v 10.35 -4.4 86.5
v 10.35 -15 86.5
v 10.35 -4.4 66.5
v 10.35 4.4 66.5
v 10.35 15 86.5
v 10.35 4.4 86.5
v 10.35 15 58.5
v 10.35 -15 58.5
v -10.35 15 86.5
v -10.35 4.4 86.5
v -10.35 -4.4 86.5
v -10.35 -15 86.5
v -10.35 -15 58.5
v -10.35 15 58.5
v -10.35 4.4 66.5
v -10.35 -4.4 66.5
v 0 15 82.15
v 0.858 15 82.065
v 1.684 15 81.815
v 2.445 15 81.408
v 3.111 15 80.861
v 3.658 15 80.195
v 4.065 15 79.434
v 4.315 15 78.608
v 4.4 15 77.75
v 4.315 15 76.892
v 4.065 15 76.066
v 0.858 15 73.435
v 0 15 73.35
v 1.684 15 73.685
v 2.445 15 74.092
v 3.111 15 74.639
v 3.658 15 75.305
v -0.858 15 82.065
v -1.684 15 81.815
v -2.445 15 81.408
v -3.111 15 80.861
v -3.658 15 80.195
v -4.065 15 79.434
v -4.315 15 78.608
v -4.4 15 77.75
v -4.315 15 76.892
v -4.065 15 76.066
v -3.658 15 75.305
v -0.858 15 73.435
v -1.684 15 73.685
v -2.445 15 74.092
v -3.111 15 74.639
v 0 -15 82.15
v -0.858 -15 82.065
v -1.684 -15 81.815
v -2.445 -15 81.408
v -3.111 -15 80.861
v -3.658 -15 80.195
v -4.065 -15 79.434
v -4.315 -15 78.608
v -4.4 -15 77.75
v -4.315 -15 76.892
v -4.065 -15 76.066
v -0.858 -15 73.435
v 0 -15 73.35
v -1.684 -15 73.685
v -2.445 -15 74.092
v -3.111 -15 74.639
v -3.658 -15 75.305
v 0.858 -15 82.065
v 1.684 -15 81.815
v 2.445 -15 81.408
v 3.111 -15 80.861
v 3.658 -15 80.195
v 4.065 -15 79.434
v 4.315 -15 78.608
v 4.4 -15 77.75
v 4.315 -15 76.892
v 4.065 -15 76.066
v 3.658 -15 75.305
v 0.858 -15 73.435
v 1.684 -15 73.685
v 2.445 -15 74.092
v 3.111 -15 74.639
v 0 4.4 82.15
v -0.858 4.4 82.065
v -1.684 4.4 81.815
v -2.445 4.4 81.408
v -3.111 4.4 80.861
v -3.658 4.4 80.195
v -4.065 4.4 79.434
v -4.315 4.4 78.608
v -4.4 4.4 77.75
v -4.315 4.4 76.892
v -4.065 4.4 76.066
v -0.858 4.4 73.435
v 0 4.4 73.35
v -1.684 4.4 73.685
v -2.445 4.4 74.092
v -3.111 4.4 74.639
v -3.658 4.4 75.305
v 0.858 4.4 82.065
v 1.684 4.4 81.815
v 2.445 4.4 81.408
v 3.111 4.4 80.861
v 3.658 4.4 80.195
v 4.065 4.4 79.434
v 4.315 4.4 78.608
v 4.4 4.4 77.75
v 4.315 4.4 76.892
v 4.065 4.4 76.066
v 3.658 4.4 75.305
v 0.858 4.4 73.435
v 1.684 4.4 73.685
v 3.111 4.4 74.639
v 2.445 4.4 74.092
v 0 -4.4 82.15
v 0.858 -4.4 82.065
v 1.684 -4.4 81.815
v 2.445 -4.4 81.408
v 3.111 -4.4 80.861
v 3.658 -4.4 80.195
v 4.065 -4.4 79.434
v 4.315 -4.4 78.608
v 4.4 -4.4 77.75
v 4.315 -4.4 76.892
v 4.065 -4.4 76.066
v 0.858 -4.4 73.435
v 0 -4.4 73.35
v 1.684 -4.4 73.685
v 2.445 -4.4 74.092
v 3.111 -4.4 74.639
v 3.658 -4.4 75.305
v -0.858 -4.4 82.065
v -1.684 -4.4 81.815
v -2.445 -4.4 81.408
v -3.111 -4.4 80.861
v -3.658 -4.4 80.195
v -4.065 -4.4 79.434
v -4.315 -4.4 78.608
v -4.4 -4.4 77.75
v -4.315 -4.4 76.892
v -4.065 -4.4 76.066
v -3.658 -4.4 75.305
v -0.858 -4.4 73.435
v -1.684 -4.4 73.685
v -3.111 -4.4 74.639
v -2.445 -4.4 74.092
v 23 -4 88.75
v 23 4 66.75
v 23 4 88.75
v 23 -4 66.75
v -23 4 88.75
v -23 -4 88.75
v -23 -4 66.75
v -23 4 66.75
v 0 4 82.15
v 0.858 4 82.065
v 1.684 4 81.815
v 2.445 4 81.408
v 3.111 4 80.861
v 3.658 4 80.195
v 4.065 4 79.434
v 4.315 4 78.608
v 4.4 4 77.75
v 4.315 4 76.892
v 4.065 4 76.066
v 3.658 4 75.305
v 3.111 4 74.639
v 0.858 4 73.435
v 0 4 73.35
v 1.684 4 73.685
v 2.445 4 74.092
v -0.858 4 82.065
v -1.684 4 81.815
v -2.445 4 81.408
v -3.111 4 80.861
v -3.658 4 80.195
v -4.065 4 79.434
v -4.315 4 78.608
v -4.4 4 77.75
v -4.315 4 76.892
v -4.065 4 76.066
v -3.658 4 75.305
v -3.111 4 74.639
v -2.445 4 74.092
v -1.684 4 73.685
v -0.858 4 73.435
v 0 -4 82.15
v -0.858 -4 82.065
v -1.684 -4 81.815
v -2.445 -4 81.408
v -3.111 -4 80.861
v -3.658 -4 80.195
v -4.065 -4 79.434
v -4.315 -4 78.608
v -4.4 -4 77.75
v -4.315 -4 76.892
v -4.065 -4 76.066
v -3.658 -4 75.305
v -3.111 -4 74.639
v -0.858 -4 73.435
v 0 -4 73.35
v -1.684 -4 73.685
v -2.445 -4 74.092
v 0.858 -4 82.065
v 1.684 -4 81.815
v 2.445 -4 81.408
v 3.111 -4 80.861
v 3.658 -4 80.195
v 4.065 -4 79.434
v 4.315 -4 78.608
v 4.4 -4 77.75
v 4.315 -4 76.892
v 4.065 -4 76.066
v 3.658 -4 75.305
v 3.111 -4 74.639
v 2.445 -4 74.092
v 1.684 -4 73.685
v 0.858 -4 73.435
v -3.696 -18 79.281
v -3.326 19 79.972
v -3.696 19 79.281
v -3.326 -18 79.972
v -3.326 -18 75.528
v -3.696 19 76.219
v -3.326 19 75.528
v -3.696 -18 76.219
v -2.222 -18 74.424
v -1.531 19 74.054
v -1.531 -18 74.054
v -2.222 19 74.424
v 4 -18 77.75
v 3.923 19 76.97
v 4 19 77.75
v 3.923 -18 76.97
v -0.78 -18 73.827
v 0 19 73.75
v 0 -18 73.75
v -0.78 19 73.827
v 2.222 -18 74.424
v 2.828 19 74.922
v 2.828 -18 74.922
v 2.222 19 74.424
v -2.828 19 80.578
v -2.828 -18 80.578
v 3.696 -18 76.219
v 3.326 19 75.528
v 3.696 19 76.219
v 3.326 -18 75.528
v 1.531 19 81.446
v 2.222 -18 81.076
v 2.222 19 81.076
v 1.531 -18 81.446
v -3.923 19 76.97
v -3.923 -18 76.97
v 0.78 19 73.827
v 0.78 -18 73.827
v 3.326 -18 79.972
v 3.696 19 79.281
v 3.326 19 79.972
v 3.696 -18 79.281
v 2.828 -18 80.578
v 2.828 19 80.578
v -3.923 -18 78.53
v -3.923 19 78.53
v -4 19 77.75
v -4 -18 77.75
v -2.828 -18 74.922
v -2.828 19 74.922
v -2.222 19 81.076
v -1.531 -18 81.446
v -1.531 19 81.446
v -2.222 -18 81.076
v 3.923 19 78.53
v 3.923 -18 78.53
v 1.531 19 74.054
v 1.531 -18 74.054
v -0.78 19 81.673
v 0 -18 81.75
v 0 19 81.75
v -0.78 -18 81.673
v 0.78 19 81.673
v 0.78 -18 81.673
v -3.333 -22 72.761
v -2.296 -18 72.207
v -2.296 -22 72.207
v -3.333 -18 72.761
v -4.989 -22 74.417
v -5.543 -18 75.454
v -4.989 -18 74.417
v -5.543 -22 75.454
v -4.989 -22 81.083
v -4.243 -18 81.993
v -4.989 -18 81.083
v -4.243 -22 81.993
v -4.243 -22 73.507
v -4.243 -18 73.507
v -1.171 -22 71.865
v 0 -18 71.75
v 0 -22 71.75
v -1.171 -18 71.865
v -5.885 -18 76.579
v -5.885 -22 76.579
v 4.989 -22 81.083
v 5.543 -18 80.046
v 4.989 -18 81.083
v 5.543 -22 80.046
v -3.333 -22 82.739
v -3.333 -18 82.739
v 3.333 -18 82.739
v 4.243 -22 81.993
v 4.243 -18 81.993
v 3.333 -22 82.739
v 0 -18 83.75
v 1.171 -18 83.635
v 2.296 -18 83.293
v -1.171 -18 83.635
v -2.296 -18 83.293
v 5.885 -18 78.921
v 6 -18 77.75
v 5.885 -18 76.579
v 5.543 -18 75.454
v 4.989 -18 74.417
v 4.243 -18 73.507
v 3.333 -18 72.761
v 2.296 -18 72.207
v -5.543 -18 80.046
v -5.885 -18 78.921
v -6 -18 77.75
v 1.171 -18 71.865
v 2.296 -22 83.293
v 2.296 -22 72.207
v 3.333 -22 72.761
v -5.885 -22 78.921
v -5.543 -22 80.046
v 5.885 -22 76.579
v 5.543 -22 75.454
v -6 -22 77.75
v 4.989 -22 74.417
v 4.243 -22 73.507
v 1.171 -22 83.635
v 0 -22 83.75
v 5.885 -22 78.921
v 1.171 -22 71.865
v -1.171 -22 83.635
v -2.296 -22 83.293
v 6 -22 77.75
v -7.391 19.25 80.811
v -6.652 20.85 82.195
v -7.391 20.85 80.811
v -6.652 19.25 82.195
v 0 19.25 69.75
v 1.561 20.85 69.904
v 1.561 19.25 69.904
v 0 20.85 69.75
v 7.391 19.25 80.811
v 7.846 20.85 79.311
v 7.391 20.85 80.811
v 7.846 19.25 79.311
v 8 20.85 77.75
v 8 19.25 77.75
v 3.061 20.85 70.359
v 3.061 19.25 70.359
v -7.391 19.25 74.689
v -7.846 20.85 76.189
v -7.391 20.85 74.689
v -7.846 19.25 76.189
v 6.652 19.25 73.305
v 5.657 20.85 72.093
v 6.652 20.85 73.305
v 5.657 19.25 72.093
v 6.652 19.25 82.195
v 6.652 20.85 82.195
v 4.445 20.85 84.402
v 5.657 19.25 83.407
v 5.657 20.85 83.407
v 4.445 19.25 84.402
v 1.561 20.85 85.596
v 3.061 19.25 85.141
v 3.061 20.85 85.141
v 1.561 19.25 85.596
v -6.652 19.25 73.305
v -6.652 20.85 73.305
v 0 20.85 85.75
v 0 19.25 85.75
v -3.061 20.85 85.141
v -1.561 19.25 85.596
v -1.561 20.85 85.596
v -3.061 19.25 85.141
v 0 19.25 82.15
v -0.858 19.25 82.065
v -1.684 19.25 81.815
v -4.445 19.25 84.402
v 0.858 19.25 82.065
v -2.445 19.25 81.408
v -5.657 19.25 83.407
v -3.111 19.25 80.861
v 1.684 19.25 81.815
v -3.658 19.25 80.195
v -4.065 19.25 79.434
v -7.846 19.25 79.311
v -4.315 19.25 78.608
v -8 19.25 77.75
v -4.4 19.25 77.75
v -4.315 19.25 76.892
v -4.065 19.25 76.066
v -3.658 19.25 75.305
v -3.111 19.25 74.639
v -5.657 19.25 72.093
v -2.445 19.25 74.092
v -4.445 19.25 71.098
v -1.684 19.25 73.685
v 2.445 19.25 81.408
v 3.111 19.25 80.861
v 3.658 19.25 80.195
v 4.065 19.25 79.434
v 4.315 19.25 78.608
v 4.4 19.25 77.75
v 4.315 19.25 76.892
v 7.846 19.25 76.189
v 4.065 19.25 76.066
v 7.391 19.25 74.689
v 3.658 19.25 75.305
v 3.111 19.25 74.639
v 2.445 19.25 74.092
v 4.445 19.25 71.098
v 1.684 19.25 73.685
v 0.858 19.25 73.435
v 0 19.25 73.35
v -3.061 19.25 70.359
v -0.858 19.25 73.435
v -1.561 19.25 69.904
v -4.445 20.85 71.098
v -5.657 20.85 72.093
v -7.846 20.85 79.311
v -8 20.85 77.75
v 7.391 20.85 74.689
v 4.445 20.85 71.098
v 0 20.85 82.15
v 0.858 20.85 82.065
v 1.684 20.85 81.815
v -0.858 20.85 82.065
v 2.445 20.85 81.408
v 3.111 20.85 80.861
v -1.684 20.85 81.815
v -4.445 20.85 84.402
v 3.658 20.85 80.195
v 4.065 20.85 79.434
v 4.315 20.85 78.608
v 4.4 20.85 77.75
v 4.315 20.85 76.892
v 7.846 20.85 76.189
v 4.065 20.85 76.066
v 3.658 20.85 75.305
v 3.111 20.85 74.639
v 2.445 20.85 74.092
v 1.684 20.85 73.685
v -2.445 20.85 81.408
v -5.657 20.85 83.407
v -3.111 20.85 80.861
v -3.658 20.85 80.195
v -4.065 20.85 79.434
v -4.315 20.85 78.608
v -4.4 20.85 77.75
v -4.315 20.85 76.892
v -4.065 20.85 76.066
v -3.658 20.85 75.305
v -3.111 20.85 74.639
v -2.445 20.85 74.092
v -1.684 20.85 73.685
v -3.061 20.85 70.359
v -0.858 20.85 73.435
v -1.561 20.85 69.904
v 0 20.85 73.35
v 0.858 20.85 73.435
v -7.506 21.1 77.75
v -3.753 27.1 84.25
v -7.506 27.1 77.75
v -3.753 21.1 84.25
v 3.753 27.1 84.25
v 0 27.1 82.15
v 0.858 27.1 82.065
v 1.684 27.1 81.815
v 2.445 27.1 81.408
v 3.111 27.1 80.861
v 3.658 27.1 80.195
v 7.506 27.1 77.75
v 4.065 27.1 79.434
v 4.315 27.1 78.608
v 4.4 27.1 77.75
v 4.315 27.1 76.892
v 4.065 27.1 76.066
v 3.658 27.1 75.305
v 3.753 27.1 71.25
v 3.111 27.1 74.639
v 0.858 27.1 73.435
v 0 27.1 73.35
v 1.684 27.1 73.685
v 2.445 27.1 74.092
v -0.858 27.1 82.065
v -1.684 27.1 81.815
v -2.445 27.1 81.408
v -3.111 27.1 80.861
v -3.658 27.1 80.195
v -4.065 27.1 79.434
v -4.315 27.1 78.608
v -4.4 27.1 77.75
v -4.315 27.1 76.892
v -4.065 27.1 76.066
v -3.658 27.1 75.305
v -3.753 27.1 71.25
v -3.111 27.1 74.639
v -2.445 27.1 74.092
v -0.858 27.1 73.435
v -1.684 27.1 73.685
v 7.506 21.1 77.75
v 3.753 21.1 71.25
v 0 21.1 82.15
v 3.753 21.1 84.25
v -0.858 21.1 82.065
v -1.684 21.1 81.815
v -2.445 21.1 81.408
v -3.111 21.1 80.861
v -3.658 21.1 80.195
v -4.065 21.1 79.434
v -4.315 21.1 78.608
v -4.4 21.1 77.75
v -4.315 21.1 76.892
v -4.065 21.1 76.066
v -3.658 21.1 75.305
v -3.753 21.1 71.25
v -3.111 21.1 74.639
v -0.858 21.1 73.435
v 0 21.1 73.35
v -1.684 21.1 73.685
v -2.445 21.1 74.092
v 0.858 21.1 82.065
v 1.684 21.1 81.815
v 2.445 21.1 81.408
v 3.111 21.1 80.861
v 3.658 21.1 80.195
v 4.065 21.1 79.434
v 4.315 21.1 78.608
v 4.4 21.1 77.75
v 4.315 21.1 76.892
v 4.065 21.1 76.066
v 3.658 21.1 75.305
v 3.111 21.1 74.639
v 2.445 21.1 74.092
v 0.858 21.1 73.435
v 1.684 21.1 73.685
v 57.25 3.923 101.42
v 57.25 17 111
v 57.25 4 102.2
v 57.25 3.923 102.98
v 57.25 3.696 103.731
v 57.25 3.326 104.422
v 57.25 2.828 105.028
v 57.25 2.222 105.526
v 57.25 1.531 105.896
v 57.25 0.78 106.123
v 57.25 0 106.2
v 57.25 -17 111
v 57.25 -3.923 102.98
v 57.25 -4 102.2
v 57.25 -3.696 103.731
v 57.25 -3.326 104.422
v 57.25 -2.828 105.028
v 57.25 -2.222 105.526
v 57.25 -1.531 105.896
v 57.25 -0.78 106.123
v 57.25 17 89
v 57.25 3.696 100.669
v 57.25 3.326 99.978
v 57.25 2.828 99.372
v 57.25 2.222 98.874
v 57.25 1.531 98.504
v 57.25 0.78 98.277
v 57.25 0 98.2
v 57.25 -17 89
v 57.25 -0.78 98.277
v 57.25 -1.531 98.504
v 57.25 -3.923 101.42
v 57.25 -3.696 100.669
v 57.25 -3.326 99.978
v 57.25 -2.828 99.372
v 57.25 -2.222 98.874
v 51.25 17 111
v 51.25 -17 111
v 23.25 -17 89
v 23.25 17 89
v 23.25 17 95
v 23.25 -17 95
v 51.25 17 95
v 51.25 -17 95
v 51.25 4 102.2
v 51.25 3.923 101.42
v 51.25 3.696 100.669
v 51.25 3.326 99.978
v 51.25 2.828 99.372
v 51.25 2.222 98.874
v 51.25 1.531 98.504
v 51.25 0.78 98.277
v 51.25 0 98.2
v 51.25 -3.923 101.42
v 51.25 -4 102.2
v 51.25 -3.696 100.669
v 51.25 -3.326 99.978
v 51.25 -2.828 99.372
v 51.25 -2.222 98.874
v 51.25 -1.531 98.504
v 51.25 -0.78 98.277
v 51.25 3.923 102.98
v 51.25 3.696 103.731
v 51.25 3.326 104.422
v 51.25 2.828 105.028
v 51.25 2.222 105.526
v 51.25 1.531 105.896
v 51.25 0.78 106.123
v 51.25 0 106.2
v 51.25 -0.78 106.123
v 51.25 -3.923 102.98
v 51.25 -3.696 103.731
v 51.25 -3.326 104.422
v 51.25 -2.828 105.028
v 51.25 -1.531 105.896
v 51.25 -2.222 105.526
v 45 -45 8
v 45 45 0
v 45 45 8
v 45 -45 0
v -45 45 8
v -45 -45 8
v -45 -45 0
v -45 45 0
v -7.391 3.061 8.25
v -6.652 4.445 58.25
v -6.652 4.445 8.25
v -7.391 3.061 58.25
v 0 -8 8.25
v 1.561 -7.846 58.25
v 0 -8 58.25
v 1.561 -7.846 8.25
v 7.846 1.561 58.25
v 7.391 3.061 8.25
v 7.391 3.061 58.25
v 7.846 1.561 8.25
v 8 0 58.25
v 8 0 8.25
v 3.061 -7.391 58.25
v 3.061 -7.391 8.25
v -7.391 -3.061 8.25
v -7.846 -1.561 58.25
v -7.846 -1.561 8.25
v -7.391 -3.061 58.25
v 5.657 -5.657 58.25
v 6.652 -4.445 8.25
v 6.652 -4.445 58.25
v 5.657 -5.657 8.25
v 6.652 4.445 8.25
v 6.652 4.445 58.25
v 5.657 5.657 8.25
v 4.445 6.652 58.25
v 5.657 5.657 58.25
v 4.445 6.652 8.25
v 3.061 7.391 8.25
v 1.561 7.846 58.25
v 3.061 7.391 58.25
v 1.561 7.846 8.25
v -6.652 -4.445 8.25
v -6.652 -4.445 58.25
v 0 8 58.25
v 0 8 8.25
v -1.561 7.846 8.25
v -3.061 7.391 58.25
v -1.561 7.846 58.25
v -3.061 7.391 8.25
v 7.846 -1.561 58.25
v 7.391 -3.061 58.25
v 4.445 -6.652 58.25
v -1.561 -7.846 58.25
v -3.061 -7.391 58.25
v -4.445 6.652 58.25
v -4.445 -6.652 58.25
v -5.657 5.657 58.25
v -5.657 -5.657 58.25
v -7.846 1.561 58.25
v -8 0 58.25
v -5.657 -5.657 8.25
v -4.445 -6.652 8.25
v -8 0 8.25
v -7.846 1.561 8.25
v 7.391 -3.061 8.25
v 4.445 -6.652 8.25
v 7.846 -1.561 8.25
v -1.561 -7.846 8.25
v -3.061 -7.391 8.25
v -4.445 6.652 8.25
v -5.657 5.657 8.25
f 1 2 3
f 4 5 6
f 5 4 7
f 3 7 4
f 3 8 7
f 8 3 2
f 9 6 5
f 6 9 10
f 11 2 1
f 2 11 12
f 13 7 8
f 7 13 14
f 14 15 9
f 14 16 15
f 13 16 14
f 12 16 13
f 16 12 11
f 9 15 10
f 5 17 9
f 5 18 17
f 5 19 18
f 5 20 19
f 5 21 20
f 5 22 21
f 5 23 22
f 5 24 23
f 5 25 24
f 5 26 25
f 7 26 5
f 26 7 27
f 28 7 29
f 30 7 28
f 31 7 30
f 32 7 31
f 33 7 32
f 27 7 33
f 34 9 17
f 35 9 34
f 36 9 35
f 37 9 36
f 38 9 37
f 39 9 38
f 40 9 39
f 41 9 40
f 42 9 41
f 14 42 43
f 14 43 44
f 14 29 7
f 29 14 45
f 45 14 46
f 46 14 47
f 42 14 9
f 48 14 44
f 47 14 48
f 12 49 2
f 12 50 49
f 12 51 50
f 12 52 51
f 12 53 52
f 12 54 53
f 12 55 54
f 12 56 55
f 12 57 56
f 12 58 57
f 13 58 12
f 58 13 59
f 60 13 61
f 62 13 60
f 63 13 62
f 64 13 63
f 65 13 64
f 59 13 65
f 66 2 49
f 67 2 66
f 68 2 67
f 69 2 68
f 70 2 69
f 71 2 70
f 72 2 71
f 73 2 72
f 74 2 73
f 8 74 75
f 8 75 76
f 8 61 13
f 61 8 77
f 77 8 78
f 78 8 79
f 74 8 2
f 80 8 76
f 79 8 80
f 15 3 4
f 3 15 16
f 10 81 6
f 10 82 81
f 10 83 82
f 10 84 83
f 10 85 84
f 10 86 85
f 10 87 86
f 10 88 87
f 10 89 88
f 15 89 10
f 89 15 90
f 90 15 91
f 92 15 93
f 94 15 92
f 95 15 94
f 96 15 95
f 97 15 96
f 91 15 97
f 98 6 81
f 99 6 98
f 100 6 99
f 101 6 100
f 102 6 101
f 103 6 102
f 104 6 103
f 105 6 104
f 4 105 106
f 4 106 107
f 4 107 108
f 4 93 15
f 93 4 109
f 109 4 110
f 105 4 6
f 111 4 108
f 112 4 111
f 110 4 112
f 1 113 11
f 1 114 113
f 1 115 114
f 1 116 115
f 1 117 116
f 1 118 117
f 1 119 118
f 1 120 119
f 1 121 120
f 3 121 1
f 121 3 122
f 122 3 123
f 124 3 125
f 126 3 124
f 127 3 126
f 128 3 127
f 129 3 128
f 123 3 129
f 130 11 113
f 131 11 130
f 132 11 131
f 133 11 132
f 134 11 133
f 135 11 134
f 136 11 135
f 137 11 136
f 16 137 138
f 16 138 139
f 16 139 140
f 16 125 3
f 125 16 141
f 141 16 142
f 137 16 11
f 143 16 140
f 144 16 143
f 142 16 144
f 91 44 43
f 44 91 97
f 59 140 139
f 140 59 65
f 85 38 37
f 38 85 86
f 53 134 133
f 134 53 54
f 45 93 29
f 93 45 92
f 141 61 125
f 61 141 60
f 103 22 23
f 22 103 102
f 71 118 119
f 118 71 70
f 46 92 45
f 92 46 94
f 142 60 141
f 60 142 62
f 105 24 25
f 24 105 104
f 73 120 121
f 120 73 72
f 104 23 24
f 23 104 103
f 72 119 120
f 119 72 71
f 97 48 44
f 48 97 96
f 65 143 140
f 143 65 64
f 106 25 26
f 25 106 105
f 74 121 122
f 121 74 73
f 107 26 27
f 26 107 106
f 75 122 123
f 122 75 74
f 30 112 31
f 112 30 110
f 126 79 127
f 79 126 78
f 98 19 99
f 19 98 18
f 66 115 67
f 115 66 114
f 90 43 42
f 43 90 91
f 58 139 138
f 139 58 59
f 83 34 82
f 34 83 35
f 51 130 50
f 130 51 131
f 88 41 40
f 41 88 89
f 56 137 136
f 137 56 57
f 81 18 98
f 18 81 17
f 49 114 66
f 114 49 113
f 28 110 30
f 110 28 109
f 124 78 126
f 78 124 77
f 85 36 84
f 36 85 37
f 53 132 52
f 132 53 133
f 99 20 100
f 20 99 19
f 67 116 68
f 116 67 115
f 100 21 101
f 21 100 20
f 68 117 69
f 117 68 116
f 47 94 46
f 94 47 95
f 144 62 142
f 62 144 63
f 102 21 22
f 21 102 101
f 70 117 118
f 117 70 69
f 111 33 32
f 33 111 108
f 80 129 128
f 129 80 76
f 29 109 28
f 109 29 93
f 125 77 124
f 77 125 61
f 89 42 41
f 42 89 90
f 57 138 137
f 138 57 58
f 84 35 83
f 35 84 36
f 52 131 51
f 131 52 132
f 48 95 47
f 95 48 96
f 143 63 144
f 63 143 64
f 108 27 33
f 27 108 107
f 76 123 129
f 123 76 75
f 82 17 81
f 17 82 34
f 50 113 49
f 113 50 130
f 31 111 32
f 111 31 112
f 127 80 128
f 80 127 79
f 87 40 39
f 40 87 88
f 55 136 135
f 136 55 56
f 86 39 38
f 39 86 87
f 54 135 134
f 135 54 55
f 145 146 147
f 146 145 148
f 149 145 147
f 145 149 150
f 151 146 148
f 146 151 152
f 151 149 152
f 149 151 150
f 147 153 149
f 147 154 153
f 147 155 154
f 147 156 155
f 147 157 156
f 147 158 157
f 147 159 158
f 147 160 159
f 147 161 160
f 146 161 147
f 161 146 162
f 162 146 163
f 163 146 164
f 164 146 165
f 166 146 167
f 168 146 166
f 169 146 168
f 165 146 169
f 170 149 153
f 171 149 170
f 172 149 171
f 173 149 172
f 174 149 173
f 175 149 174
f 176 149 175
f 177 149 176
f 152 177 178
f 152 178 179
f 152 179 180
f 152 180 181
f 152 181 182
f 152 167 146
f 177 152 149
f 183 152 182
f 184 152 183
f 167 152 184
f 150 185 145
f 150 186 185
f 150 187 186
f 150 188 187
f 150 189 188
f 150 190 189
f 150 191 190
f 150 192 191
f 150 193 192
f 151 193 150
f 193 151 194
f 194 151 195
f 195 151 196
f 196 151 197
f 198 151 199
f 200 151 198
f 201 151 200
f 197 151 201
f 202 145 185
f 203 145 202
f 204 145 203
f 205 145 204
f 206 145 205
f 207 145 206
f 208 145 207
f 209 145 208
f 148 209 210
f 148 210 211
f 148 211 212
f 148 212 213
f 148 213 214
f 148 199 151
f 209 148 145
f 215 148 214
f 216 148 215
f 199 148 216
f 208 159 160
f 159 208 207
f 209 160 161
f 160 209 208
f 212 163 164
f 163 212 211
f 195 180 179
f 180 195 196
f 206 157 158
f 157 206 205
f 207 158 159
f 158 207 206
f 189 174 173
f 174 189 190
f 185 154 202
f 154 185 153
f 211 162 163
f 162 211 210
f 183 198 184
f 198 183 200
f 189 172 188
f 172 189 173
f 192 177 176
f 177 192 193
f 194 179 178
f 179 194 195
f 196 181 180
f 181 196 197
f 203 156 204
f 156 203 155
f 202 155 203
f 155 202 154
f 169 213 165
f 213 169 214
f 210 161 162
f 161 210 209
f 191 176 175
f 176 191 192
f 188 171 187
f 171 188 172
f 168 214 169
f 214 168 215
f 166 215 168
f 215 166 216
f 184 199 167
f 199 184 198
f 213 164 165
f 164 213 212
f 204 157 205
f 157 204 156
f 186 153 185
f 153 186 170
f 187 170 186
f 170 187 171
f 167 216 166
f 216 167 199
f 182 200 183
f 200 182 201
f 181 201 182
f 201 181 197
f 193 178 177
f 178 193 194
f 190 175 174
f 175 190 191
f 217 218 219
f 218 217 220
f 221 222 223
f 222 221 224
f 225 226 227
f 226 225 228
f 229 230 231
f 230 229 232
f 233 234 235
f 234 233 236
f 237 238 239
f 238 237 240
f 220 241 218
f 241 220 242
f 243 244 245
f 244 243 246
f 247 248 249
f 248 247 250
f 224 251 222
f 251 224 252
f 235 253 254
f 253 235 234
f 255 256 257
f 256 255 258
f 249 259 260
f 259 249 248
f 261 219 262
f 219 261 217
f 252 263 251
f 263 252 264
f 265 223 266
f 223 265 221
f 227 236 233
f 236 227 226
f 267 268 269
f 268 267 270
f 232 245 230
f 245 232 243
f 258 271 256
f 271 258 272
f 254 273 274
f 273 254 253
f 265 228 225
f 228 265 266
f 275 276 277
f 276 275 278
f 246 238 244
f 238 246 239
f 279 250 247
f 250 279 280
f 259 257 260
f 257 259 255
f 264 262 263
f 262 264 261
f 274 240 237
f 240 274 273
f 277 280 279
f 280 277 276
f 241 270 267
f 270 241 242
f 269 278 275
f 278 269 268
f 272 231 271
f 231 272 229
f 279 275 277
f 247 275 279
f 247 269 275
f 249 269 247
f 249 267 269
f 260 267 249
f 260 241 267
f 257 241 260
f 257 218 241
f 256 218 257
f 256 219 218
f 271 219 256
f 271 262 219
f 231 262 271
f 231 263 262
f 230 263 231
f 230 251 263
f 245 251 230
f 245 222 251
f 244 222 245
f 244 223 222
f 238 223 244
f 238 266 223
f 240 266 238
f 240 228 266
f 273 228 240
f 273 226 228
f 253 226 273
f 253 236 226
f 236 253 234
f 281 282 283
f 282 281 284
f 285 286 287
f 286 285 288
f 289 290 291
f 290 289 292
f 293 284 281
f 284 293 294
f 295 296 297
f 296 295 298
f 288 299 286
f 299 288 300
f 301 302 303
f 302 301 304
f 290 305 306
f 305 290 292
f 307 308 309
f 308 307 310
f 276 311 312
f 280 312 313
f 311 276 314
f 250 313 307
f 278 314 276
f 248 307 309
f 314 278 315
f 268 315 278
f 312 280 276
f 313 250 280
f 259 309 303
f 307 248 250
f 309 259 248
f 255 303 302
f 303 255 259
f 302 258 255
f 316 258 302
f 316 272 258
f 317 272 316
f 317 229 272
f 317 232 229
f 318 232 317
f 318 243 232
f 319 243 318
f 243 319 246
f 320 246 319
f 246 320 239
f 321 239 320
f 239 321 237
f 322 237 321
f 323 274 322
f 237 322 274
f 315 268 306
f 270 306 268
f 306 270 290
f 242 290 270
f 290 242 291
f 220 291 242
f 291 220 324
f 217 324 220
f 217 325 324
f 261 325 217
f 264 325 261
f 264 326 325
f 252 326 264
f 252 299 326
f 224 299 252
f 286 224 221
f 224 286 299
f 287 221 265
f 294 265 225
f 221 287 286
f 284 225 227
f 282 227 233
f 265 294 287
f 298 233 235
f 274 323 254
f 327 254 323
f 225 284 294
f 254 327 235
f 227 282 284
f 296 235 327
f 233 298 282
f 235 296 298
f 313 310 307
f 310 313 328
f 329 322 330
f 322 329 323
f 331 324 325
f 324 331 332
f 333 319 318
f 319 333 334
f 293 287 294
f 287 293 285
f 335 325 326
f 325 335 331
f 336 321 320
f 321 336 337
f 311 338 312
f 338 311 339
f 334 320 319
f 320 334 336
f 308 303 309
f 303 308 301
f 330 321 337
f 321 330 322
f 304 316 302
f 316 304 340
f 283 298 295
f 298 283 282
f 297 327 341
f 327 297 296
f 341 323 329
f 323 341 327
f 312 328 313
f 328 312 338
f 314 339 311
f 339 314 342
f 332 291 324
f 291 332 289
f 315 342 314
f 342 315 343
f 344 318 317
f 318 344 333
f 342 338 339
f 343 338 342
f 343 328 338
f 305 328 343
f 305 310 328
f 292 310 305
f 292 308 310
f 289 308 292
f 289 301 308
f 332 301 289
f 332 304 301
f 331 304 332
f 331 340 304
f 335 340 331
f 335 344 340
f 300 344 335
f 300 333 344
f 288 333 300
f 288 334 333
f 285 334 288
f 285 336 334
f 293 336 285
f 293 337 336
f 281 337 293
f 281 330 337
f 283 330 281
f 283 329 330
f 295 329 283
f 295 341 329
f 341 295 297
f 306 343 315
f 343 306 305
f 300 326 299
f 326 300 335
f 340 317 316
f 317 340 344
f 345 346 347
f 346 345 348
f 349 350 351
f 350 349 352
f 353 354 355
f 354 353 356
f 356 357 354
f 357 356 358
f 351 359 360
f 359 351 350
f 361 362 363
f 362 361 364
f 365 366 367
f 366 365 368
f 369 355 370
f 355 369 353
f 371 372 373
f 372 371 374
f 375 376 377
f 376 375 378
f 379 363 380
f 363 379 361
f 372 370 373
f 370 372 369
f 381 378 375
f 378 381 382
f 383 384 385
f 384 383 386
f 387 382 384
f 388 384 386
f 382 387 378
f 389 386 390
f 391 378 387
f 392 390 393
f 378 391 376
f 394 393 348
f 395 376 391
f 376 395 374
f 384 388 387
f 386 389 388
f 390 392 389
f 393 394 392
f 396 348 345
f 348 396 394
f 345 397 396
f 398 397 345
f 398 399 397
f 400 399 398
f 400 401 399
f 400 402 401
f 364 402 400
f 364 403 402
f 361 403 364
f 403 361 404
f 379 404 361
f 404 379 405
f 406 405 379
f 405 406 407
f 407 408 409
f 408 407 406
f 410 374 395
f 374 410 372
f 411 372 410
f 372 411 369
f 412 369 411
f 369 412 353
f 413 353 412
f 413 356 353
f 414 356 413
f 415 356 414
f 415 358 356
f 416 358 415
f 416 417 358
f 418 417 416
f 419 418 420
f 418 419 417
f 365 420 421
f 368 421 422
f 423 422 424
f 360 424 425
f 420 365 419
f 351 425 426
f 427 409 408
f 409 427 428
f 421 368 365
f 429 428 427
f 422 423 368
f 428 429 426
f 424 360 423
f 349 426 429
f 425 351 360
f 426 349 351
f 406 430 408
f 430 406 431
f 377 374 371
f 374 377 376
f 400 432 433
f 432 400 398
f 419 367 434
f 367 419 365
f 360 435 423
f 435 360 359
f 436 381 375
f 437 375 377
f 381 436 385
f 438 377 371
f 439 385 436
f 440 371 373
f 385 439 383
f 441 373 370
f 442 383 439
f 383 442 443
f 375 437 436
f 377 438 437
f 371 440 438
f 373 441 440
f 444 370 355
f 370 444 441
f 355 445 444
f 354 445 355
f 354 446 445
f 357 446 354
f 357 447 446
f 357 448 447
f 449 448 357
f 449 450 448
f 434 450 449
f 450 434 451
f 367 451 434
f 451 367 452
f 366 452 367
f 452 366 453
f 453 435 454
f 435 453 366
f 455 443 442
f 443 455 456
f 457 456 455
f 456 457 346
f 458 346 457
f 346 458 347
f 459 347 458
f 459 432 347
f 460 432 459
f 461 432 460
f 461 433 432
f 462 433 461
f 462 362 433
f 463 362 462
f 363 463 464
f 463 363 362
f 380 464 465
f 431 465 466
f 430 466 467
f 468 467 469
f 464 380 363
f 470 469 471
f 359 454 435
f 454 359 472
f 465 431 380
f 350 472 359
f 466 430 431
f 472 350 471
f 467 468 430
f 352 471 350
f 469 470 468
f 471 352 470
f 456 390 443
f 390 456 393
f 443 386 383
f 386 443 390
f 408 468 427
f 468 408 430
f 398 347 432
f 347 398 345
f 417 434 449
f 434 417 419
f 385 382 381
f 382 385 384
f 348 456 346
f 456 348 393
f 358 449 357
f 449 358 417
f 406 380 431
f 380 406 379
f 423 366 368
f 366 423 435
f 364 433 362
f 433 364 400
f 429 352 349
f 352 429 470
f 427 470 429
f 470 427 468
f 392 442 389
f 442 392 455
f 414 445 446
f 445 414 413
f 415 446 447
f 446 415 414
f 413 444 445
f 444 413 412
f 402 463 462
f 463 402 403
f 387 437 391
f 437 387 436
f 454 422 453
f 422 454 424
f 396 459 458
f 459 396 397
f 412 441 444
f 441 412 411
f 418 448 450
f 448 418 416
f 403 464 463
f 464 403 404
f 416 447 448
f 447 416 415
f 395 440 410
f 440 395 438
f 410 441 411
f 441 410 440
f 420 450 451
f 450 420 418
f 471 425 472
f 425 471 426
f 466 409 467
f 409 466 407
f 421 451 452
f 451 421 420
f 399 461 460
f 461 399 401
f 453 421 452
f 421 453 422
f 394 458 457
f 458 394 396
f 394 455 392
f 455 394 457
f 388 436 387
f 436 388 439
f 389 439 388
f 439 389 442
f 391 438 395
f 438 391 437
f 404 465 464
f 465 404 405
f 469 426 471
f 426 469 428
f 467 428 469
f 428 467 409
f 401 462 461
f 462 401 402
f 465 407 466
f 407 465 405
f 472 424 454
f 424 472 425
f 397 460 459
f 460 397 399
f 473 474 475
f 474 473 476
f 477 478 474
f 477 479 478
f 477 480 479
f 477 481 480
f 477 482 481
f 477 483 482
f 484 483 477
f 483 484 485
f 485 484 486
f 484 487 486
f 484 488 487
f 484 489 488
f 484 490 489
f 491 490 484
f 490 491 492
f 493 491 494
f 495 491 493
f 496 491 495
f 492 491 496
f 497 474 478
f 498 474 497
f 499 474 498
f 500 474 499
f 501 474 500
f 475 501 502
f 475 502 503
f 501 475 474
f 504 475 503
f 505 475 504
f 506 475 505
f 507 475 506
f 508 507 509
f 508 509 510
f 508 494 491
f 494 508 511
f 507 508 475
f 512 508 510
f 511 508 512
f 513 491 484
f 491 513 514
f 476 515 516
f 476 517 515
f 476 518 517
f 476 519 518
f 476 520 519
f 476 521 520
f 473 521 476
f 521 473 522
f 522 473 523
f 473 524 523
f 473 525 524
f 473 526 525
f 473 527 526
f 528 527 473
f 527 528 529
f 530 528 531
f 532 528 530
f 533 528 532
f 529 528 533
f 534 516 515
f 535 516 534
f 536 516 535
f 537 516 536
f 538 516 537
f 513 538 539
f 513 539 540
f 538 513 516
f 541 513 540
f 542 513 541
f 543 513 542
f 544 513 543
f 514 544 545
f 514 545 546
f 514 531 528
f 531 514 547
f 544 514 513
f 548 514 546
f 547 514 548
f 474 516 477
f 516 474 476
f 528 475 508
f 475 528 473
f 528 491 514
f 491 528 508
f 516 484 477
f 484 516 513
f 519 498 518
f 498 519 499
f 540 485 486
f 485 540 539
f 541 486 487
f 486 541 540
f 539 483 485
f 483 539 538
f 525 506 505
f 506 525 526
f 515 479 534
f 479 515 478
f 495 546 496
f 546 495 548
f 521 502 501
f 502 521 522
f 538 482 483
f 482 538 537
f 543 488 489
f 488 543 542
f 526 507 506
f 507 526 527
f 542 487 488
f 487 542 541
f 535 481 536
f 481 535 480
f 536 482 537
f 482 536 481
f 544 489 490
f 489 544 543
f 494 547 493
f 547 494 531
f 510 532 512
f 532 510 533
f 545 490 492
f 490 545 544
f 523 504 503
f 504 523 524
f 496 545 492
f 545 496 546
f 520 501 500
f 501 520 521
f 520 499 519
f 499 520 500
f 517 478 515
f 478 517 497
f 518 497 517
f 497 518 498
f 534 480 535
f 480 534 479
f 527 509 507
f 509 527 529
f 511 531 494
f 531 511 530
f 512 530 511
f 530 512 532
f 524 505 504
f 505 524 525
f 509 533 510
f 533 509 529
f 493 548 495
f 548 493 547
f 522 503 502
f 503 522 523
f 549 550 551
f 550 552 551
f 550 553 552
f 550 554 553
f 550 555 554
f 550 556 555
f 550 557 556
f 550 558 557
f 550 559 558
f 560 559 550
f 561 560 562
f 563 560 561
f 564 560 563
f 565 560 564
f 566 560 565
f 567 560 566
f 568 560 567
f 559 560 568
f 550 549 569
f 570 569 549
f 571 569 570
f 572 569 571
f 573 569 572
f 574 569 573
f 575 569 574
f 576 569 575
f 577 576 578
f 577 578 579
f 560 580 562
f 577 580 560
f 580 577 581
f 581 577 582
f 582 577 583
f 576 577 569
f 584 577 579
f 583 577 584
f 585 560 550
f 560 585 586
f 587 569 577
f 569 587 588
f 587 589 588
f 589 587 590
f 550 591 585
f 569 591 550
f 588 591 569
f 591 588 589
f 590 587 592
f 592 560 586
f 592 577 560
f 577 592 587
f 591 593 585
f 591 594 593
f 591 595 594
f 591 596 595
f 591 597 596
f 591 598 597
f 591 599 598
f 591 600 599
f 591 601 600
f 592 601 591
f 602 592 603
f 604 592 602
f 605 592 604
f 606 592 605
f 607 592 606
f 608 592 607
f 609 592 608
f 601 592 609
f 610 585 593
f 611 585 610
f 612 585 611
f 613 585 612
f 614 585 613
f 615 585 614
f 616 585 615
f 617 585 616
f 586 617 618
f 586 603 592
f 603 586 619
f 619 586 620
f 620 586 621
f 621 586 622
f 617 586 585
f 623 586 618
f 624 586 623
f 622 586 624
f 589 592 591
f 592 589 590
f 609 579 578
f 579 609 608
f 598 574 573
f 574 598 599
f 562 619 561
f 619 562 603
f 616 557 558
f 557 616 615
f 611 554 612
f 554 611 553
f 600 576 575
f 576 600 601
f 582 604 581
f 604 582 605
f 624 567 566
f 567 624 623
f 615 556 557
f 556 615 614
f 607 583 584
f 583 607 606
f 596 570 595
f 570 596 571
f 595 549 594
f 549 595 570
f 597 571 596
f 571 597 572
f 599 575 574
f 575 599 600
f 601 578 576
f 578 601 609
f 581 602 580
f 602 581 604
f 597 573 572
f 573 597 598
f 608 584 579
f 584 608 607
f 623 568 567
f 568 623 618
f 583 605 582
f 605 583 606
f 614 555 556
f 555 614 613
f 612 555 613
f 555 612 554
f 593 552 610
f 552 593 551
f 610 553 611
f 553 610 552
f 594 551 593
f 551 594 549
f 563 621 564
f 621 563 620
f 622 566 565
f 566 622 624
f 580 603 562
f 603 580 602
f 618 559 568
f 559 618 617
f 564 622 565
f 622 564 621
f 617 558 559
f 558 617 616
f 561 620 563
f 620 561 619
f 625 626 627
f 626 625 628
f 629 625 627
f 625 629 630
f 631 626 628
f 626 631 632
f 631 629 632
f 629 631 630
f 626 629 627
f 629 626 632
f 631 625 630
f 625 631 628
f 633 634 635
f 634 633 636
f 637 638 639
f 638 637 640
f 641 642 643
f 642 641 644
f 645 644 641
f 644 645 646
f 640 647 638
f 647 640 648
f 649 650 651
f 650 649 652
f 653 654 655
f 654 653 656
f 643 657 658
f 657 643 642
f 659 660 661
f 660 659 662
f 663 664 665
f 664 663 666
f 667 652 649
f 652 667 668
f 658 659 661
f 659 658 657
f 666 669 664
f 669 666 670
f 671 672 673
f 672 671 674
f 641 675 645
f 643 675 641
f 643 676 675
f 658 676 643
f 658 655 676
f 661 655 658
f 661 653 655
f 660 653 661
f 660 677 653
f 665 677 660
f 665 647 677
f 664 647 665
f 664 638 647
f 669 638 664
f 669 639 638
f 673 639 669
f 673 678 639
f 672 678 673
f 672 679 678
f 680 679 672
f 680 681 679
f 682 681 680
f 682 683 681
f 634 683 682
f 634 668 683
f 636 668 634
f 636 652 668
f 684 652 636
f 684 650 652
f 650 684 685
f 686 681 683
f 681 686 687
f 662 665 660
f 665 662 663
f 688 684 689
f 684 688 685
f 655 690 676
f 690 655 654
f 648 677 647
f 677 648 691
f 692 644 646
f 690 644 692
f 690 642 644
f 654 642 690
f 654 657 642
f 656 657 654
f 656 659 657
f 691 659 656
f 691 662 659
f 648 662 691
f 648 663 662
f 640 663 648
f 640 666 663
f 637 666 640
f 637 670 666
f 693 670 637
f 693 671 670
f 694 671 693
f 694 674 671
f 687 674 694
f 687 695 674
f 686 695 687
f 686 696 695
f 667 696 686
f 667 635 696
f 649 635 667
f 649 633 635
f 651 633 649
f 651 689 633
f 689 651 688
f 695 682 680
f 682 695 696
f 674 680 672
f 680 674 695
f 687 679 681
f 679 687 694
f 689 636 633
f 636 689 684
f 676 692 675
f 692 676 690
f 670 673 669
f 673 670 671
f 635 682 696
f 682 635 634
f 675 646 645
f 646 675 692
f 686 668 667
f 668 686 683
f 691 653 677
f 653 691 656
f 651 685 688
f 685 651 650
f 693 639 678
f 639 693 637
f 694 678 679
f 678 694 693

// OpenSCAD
$fn = 32;

// ------------------------------------------------------------------------
// Lamp arm: column d16 x 50 mm, arm 46 mm
// Every part is its own module, assembly() places every instance.
// ------------------------------------------------------------------------

// --- part 1 ---
module lamp_base() {
  difference() {
    translate([-45, -45, 0]) cube([90, 90, 8]);
  }
}

// --- part 2 ---
module lamp_column() {
  cylinder(h = 50, d = 16);
}

// --- part 3 ---
module head_fork() {
  difference() {
    translate([-10.35, -15, 0]) cube([20.7, 30, 28]);
    translate([-11.35, -4.4, 8]) cube([22.7, 8.8, 21]);
    translate([0, 0, 19.25]) rotate([90, 0, 0]) cylinder(h = 32, d = 8.8, center = true);
  }
}

// --- part 4 ---
module lamp_arm() {
  difference() {
    translate([-23, -4, 0]) cube([46, 8, 22]);
    translate([0, 0, 11]) rotate([90, 0, 0]) cylinder(h = 10, d = 8.8, center = true);
  }
}

// --- part 5 ---
module arm_pin() {
  rotate([0, 90, 0]) cylinder(h = 38, d = 8, center = true);
  translate([-22, 0, 0]) rotate([0, 90, 0]) cylinder(h = 4, d = 12);
}

// --- part 6 ---
module arm_washer() {
  difference() {
      translate([0, 0, 0]) cylinder(h = 1.6, d = 16);
      translate([0, 0, -1]) cylinder(h = 3.6, d = 8.8);
    }
}

// --- part 7 ---
module arm_nut() {
  difference() {
    linear_extrude(height = 6) polygon(points = [[7.506, 0], [3.753, 6.5], [-3.753, 6.5], [-7.506, 0], [-3.753, -6.5], [3.753, -6.5]]);
    translate([0, 0, -1]) cylinder(h = 8, d = 8.8);
  }
}

// --- part 8 ---
module shade_bracket() {
  difference() {
    translate([-17, -17, 0]) cube([34, 34, 22]);
    translate([-18, -18, 6]) cube([29, 36, 17]);
    translate([14, 0, 13.2]) rotate([0, 90, 0]) cylinder(h = 8, d = 8, center = true);
  }
}

// --- assembly ---
module assembly() {
  color([0.80, 0.24, 0.20]) translate([0, 0, 0]) rotate([0, 0, 0]) lamp_base();
  color([0.20, 0.45, 0.75]) translate([0, 0, 8.25]) rotate([0, 0, 0]) lamp_column();
  color([0.25, 0.62, 0.32]) translate([0, 0, 58.5]) rotate([0, 0, 0]) head_fork();
  color([0.92, 0.70, 0.18]) translate([0, 0, 66.75]) rotate([0, 0, 0]) lamp_arm();
  color([0.58, 0.35, 0.70]) translate([0, 0, 77.75]) rotate([0, 0, 90]) arm_pin();
  color([0.16, 0.66, 0.66]) translate([0, 20.85, 77.75]) rotate([90, 0, 0]) arm_washer();
  color([0.85, 0.48, 0.18]) translate([0, 27.1, 77.75]) rotate([90, 0, 0]) arm_nut();
  color([0.55, 0.60, 0.65]) translate([40.25, 0, 89]) rotate([0, 0, 0]) shade_bracket();
}

assembly();
